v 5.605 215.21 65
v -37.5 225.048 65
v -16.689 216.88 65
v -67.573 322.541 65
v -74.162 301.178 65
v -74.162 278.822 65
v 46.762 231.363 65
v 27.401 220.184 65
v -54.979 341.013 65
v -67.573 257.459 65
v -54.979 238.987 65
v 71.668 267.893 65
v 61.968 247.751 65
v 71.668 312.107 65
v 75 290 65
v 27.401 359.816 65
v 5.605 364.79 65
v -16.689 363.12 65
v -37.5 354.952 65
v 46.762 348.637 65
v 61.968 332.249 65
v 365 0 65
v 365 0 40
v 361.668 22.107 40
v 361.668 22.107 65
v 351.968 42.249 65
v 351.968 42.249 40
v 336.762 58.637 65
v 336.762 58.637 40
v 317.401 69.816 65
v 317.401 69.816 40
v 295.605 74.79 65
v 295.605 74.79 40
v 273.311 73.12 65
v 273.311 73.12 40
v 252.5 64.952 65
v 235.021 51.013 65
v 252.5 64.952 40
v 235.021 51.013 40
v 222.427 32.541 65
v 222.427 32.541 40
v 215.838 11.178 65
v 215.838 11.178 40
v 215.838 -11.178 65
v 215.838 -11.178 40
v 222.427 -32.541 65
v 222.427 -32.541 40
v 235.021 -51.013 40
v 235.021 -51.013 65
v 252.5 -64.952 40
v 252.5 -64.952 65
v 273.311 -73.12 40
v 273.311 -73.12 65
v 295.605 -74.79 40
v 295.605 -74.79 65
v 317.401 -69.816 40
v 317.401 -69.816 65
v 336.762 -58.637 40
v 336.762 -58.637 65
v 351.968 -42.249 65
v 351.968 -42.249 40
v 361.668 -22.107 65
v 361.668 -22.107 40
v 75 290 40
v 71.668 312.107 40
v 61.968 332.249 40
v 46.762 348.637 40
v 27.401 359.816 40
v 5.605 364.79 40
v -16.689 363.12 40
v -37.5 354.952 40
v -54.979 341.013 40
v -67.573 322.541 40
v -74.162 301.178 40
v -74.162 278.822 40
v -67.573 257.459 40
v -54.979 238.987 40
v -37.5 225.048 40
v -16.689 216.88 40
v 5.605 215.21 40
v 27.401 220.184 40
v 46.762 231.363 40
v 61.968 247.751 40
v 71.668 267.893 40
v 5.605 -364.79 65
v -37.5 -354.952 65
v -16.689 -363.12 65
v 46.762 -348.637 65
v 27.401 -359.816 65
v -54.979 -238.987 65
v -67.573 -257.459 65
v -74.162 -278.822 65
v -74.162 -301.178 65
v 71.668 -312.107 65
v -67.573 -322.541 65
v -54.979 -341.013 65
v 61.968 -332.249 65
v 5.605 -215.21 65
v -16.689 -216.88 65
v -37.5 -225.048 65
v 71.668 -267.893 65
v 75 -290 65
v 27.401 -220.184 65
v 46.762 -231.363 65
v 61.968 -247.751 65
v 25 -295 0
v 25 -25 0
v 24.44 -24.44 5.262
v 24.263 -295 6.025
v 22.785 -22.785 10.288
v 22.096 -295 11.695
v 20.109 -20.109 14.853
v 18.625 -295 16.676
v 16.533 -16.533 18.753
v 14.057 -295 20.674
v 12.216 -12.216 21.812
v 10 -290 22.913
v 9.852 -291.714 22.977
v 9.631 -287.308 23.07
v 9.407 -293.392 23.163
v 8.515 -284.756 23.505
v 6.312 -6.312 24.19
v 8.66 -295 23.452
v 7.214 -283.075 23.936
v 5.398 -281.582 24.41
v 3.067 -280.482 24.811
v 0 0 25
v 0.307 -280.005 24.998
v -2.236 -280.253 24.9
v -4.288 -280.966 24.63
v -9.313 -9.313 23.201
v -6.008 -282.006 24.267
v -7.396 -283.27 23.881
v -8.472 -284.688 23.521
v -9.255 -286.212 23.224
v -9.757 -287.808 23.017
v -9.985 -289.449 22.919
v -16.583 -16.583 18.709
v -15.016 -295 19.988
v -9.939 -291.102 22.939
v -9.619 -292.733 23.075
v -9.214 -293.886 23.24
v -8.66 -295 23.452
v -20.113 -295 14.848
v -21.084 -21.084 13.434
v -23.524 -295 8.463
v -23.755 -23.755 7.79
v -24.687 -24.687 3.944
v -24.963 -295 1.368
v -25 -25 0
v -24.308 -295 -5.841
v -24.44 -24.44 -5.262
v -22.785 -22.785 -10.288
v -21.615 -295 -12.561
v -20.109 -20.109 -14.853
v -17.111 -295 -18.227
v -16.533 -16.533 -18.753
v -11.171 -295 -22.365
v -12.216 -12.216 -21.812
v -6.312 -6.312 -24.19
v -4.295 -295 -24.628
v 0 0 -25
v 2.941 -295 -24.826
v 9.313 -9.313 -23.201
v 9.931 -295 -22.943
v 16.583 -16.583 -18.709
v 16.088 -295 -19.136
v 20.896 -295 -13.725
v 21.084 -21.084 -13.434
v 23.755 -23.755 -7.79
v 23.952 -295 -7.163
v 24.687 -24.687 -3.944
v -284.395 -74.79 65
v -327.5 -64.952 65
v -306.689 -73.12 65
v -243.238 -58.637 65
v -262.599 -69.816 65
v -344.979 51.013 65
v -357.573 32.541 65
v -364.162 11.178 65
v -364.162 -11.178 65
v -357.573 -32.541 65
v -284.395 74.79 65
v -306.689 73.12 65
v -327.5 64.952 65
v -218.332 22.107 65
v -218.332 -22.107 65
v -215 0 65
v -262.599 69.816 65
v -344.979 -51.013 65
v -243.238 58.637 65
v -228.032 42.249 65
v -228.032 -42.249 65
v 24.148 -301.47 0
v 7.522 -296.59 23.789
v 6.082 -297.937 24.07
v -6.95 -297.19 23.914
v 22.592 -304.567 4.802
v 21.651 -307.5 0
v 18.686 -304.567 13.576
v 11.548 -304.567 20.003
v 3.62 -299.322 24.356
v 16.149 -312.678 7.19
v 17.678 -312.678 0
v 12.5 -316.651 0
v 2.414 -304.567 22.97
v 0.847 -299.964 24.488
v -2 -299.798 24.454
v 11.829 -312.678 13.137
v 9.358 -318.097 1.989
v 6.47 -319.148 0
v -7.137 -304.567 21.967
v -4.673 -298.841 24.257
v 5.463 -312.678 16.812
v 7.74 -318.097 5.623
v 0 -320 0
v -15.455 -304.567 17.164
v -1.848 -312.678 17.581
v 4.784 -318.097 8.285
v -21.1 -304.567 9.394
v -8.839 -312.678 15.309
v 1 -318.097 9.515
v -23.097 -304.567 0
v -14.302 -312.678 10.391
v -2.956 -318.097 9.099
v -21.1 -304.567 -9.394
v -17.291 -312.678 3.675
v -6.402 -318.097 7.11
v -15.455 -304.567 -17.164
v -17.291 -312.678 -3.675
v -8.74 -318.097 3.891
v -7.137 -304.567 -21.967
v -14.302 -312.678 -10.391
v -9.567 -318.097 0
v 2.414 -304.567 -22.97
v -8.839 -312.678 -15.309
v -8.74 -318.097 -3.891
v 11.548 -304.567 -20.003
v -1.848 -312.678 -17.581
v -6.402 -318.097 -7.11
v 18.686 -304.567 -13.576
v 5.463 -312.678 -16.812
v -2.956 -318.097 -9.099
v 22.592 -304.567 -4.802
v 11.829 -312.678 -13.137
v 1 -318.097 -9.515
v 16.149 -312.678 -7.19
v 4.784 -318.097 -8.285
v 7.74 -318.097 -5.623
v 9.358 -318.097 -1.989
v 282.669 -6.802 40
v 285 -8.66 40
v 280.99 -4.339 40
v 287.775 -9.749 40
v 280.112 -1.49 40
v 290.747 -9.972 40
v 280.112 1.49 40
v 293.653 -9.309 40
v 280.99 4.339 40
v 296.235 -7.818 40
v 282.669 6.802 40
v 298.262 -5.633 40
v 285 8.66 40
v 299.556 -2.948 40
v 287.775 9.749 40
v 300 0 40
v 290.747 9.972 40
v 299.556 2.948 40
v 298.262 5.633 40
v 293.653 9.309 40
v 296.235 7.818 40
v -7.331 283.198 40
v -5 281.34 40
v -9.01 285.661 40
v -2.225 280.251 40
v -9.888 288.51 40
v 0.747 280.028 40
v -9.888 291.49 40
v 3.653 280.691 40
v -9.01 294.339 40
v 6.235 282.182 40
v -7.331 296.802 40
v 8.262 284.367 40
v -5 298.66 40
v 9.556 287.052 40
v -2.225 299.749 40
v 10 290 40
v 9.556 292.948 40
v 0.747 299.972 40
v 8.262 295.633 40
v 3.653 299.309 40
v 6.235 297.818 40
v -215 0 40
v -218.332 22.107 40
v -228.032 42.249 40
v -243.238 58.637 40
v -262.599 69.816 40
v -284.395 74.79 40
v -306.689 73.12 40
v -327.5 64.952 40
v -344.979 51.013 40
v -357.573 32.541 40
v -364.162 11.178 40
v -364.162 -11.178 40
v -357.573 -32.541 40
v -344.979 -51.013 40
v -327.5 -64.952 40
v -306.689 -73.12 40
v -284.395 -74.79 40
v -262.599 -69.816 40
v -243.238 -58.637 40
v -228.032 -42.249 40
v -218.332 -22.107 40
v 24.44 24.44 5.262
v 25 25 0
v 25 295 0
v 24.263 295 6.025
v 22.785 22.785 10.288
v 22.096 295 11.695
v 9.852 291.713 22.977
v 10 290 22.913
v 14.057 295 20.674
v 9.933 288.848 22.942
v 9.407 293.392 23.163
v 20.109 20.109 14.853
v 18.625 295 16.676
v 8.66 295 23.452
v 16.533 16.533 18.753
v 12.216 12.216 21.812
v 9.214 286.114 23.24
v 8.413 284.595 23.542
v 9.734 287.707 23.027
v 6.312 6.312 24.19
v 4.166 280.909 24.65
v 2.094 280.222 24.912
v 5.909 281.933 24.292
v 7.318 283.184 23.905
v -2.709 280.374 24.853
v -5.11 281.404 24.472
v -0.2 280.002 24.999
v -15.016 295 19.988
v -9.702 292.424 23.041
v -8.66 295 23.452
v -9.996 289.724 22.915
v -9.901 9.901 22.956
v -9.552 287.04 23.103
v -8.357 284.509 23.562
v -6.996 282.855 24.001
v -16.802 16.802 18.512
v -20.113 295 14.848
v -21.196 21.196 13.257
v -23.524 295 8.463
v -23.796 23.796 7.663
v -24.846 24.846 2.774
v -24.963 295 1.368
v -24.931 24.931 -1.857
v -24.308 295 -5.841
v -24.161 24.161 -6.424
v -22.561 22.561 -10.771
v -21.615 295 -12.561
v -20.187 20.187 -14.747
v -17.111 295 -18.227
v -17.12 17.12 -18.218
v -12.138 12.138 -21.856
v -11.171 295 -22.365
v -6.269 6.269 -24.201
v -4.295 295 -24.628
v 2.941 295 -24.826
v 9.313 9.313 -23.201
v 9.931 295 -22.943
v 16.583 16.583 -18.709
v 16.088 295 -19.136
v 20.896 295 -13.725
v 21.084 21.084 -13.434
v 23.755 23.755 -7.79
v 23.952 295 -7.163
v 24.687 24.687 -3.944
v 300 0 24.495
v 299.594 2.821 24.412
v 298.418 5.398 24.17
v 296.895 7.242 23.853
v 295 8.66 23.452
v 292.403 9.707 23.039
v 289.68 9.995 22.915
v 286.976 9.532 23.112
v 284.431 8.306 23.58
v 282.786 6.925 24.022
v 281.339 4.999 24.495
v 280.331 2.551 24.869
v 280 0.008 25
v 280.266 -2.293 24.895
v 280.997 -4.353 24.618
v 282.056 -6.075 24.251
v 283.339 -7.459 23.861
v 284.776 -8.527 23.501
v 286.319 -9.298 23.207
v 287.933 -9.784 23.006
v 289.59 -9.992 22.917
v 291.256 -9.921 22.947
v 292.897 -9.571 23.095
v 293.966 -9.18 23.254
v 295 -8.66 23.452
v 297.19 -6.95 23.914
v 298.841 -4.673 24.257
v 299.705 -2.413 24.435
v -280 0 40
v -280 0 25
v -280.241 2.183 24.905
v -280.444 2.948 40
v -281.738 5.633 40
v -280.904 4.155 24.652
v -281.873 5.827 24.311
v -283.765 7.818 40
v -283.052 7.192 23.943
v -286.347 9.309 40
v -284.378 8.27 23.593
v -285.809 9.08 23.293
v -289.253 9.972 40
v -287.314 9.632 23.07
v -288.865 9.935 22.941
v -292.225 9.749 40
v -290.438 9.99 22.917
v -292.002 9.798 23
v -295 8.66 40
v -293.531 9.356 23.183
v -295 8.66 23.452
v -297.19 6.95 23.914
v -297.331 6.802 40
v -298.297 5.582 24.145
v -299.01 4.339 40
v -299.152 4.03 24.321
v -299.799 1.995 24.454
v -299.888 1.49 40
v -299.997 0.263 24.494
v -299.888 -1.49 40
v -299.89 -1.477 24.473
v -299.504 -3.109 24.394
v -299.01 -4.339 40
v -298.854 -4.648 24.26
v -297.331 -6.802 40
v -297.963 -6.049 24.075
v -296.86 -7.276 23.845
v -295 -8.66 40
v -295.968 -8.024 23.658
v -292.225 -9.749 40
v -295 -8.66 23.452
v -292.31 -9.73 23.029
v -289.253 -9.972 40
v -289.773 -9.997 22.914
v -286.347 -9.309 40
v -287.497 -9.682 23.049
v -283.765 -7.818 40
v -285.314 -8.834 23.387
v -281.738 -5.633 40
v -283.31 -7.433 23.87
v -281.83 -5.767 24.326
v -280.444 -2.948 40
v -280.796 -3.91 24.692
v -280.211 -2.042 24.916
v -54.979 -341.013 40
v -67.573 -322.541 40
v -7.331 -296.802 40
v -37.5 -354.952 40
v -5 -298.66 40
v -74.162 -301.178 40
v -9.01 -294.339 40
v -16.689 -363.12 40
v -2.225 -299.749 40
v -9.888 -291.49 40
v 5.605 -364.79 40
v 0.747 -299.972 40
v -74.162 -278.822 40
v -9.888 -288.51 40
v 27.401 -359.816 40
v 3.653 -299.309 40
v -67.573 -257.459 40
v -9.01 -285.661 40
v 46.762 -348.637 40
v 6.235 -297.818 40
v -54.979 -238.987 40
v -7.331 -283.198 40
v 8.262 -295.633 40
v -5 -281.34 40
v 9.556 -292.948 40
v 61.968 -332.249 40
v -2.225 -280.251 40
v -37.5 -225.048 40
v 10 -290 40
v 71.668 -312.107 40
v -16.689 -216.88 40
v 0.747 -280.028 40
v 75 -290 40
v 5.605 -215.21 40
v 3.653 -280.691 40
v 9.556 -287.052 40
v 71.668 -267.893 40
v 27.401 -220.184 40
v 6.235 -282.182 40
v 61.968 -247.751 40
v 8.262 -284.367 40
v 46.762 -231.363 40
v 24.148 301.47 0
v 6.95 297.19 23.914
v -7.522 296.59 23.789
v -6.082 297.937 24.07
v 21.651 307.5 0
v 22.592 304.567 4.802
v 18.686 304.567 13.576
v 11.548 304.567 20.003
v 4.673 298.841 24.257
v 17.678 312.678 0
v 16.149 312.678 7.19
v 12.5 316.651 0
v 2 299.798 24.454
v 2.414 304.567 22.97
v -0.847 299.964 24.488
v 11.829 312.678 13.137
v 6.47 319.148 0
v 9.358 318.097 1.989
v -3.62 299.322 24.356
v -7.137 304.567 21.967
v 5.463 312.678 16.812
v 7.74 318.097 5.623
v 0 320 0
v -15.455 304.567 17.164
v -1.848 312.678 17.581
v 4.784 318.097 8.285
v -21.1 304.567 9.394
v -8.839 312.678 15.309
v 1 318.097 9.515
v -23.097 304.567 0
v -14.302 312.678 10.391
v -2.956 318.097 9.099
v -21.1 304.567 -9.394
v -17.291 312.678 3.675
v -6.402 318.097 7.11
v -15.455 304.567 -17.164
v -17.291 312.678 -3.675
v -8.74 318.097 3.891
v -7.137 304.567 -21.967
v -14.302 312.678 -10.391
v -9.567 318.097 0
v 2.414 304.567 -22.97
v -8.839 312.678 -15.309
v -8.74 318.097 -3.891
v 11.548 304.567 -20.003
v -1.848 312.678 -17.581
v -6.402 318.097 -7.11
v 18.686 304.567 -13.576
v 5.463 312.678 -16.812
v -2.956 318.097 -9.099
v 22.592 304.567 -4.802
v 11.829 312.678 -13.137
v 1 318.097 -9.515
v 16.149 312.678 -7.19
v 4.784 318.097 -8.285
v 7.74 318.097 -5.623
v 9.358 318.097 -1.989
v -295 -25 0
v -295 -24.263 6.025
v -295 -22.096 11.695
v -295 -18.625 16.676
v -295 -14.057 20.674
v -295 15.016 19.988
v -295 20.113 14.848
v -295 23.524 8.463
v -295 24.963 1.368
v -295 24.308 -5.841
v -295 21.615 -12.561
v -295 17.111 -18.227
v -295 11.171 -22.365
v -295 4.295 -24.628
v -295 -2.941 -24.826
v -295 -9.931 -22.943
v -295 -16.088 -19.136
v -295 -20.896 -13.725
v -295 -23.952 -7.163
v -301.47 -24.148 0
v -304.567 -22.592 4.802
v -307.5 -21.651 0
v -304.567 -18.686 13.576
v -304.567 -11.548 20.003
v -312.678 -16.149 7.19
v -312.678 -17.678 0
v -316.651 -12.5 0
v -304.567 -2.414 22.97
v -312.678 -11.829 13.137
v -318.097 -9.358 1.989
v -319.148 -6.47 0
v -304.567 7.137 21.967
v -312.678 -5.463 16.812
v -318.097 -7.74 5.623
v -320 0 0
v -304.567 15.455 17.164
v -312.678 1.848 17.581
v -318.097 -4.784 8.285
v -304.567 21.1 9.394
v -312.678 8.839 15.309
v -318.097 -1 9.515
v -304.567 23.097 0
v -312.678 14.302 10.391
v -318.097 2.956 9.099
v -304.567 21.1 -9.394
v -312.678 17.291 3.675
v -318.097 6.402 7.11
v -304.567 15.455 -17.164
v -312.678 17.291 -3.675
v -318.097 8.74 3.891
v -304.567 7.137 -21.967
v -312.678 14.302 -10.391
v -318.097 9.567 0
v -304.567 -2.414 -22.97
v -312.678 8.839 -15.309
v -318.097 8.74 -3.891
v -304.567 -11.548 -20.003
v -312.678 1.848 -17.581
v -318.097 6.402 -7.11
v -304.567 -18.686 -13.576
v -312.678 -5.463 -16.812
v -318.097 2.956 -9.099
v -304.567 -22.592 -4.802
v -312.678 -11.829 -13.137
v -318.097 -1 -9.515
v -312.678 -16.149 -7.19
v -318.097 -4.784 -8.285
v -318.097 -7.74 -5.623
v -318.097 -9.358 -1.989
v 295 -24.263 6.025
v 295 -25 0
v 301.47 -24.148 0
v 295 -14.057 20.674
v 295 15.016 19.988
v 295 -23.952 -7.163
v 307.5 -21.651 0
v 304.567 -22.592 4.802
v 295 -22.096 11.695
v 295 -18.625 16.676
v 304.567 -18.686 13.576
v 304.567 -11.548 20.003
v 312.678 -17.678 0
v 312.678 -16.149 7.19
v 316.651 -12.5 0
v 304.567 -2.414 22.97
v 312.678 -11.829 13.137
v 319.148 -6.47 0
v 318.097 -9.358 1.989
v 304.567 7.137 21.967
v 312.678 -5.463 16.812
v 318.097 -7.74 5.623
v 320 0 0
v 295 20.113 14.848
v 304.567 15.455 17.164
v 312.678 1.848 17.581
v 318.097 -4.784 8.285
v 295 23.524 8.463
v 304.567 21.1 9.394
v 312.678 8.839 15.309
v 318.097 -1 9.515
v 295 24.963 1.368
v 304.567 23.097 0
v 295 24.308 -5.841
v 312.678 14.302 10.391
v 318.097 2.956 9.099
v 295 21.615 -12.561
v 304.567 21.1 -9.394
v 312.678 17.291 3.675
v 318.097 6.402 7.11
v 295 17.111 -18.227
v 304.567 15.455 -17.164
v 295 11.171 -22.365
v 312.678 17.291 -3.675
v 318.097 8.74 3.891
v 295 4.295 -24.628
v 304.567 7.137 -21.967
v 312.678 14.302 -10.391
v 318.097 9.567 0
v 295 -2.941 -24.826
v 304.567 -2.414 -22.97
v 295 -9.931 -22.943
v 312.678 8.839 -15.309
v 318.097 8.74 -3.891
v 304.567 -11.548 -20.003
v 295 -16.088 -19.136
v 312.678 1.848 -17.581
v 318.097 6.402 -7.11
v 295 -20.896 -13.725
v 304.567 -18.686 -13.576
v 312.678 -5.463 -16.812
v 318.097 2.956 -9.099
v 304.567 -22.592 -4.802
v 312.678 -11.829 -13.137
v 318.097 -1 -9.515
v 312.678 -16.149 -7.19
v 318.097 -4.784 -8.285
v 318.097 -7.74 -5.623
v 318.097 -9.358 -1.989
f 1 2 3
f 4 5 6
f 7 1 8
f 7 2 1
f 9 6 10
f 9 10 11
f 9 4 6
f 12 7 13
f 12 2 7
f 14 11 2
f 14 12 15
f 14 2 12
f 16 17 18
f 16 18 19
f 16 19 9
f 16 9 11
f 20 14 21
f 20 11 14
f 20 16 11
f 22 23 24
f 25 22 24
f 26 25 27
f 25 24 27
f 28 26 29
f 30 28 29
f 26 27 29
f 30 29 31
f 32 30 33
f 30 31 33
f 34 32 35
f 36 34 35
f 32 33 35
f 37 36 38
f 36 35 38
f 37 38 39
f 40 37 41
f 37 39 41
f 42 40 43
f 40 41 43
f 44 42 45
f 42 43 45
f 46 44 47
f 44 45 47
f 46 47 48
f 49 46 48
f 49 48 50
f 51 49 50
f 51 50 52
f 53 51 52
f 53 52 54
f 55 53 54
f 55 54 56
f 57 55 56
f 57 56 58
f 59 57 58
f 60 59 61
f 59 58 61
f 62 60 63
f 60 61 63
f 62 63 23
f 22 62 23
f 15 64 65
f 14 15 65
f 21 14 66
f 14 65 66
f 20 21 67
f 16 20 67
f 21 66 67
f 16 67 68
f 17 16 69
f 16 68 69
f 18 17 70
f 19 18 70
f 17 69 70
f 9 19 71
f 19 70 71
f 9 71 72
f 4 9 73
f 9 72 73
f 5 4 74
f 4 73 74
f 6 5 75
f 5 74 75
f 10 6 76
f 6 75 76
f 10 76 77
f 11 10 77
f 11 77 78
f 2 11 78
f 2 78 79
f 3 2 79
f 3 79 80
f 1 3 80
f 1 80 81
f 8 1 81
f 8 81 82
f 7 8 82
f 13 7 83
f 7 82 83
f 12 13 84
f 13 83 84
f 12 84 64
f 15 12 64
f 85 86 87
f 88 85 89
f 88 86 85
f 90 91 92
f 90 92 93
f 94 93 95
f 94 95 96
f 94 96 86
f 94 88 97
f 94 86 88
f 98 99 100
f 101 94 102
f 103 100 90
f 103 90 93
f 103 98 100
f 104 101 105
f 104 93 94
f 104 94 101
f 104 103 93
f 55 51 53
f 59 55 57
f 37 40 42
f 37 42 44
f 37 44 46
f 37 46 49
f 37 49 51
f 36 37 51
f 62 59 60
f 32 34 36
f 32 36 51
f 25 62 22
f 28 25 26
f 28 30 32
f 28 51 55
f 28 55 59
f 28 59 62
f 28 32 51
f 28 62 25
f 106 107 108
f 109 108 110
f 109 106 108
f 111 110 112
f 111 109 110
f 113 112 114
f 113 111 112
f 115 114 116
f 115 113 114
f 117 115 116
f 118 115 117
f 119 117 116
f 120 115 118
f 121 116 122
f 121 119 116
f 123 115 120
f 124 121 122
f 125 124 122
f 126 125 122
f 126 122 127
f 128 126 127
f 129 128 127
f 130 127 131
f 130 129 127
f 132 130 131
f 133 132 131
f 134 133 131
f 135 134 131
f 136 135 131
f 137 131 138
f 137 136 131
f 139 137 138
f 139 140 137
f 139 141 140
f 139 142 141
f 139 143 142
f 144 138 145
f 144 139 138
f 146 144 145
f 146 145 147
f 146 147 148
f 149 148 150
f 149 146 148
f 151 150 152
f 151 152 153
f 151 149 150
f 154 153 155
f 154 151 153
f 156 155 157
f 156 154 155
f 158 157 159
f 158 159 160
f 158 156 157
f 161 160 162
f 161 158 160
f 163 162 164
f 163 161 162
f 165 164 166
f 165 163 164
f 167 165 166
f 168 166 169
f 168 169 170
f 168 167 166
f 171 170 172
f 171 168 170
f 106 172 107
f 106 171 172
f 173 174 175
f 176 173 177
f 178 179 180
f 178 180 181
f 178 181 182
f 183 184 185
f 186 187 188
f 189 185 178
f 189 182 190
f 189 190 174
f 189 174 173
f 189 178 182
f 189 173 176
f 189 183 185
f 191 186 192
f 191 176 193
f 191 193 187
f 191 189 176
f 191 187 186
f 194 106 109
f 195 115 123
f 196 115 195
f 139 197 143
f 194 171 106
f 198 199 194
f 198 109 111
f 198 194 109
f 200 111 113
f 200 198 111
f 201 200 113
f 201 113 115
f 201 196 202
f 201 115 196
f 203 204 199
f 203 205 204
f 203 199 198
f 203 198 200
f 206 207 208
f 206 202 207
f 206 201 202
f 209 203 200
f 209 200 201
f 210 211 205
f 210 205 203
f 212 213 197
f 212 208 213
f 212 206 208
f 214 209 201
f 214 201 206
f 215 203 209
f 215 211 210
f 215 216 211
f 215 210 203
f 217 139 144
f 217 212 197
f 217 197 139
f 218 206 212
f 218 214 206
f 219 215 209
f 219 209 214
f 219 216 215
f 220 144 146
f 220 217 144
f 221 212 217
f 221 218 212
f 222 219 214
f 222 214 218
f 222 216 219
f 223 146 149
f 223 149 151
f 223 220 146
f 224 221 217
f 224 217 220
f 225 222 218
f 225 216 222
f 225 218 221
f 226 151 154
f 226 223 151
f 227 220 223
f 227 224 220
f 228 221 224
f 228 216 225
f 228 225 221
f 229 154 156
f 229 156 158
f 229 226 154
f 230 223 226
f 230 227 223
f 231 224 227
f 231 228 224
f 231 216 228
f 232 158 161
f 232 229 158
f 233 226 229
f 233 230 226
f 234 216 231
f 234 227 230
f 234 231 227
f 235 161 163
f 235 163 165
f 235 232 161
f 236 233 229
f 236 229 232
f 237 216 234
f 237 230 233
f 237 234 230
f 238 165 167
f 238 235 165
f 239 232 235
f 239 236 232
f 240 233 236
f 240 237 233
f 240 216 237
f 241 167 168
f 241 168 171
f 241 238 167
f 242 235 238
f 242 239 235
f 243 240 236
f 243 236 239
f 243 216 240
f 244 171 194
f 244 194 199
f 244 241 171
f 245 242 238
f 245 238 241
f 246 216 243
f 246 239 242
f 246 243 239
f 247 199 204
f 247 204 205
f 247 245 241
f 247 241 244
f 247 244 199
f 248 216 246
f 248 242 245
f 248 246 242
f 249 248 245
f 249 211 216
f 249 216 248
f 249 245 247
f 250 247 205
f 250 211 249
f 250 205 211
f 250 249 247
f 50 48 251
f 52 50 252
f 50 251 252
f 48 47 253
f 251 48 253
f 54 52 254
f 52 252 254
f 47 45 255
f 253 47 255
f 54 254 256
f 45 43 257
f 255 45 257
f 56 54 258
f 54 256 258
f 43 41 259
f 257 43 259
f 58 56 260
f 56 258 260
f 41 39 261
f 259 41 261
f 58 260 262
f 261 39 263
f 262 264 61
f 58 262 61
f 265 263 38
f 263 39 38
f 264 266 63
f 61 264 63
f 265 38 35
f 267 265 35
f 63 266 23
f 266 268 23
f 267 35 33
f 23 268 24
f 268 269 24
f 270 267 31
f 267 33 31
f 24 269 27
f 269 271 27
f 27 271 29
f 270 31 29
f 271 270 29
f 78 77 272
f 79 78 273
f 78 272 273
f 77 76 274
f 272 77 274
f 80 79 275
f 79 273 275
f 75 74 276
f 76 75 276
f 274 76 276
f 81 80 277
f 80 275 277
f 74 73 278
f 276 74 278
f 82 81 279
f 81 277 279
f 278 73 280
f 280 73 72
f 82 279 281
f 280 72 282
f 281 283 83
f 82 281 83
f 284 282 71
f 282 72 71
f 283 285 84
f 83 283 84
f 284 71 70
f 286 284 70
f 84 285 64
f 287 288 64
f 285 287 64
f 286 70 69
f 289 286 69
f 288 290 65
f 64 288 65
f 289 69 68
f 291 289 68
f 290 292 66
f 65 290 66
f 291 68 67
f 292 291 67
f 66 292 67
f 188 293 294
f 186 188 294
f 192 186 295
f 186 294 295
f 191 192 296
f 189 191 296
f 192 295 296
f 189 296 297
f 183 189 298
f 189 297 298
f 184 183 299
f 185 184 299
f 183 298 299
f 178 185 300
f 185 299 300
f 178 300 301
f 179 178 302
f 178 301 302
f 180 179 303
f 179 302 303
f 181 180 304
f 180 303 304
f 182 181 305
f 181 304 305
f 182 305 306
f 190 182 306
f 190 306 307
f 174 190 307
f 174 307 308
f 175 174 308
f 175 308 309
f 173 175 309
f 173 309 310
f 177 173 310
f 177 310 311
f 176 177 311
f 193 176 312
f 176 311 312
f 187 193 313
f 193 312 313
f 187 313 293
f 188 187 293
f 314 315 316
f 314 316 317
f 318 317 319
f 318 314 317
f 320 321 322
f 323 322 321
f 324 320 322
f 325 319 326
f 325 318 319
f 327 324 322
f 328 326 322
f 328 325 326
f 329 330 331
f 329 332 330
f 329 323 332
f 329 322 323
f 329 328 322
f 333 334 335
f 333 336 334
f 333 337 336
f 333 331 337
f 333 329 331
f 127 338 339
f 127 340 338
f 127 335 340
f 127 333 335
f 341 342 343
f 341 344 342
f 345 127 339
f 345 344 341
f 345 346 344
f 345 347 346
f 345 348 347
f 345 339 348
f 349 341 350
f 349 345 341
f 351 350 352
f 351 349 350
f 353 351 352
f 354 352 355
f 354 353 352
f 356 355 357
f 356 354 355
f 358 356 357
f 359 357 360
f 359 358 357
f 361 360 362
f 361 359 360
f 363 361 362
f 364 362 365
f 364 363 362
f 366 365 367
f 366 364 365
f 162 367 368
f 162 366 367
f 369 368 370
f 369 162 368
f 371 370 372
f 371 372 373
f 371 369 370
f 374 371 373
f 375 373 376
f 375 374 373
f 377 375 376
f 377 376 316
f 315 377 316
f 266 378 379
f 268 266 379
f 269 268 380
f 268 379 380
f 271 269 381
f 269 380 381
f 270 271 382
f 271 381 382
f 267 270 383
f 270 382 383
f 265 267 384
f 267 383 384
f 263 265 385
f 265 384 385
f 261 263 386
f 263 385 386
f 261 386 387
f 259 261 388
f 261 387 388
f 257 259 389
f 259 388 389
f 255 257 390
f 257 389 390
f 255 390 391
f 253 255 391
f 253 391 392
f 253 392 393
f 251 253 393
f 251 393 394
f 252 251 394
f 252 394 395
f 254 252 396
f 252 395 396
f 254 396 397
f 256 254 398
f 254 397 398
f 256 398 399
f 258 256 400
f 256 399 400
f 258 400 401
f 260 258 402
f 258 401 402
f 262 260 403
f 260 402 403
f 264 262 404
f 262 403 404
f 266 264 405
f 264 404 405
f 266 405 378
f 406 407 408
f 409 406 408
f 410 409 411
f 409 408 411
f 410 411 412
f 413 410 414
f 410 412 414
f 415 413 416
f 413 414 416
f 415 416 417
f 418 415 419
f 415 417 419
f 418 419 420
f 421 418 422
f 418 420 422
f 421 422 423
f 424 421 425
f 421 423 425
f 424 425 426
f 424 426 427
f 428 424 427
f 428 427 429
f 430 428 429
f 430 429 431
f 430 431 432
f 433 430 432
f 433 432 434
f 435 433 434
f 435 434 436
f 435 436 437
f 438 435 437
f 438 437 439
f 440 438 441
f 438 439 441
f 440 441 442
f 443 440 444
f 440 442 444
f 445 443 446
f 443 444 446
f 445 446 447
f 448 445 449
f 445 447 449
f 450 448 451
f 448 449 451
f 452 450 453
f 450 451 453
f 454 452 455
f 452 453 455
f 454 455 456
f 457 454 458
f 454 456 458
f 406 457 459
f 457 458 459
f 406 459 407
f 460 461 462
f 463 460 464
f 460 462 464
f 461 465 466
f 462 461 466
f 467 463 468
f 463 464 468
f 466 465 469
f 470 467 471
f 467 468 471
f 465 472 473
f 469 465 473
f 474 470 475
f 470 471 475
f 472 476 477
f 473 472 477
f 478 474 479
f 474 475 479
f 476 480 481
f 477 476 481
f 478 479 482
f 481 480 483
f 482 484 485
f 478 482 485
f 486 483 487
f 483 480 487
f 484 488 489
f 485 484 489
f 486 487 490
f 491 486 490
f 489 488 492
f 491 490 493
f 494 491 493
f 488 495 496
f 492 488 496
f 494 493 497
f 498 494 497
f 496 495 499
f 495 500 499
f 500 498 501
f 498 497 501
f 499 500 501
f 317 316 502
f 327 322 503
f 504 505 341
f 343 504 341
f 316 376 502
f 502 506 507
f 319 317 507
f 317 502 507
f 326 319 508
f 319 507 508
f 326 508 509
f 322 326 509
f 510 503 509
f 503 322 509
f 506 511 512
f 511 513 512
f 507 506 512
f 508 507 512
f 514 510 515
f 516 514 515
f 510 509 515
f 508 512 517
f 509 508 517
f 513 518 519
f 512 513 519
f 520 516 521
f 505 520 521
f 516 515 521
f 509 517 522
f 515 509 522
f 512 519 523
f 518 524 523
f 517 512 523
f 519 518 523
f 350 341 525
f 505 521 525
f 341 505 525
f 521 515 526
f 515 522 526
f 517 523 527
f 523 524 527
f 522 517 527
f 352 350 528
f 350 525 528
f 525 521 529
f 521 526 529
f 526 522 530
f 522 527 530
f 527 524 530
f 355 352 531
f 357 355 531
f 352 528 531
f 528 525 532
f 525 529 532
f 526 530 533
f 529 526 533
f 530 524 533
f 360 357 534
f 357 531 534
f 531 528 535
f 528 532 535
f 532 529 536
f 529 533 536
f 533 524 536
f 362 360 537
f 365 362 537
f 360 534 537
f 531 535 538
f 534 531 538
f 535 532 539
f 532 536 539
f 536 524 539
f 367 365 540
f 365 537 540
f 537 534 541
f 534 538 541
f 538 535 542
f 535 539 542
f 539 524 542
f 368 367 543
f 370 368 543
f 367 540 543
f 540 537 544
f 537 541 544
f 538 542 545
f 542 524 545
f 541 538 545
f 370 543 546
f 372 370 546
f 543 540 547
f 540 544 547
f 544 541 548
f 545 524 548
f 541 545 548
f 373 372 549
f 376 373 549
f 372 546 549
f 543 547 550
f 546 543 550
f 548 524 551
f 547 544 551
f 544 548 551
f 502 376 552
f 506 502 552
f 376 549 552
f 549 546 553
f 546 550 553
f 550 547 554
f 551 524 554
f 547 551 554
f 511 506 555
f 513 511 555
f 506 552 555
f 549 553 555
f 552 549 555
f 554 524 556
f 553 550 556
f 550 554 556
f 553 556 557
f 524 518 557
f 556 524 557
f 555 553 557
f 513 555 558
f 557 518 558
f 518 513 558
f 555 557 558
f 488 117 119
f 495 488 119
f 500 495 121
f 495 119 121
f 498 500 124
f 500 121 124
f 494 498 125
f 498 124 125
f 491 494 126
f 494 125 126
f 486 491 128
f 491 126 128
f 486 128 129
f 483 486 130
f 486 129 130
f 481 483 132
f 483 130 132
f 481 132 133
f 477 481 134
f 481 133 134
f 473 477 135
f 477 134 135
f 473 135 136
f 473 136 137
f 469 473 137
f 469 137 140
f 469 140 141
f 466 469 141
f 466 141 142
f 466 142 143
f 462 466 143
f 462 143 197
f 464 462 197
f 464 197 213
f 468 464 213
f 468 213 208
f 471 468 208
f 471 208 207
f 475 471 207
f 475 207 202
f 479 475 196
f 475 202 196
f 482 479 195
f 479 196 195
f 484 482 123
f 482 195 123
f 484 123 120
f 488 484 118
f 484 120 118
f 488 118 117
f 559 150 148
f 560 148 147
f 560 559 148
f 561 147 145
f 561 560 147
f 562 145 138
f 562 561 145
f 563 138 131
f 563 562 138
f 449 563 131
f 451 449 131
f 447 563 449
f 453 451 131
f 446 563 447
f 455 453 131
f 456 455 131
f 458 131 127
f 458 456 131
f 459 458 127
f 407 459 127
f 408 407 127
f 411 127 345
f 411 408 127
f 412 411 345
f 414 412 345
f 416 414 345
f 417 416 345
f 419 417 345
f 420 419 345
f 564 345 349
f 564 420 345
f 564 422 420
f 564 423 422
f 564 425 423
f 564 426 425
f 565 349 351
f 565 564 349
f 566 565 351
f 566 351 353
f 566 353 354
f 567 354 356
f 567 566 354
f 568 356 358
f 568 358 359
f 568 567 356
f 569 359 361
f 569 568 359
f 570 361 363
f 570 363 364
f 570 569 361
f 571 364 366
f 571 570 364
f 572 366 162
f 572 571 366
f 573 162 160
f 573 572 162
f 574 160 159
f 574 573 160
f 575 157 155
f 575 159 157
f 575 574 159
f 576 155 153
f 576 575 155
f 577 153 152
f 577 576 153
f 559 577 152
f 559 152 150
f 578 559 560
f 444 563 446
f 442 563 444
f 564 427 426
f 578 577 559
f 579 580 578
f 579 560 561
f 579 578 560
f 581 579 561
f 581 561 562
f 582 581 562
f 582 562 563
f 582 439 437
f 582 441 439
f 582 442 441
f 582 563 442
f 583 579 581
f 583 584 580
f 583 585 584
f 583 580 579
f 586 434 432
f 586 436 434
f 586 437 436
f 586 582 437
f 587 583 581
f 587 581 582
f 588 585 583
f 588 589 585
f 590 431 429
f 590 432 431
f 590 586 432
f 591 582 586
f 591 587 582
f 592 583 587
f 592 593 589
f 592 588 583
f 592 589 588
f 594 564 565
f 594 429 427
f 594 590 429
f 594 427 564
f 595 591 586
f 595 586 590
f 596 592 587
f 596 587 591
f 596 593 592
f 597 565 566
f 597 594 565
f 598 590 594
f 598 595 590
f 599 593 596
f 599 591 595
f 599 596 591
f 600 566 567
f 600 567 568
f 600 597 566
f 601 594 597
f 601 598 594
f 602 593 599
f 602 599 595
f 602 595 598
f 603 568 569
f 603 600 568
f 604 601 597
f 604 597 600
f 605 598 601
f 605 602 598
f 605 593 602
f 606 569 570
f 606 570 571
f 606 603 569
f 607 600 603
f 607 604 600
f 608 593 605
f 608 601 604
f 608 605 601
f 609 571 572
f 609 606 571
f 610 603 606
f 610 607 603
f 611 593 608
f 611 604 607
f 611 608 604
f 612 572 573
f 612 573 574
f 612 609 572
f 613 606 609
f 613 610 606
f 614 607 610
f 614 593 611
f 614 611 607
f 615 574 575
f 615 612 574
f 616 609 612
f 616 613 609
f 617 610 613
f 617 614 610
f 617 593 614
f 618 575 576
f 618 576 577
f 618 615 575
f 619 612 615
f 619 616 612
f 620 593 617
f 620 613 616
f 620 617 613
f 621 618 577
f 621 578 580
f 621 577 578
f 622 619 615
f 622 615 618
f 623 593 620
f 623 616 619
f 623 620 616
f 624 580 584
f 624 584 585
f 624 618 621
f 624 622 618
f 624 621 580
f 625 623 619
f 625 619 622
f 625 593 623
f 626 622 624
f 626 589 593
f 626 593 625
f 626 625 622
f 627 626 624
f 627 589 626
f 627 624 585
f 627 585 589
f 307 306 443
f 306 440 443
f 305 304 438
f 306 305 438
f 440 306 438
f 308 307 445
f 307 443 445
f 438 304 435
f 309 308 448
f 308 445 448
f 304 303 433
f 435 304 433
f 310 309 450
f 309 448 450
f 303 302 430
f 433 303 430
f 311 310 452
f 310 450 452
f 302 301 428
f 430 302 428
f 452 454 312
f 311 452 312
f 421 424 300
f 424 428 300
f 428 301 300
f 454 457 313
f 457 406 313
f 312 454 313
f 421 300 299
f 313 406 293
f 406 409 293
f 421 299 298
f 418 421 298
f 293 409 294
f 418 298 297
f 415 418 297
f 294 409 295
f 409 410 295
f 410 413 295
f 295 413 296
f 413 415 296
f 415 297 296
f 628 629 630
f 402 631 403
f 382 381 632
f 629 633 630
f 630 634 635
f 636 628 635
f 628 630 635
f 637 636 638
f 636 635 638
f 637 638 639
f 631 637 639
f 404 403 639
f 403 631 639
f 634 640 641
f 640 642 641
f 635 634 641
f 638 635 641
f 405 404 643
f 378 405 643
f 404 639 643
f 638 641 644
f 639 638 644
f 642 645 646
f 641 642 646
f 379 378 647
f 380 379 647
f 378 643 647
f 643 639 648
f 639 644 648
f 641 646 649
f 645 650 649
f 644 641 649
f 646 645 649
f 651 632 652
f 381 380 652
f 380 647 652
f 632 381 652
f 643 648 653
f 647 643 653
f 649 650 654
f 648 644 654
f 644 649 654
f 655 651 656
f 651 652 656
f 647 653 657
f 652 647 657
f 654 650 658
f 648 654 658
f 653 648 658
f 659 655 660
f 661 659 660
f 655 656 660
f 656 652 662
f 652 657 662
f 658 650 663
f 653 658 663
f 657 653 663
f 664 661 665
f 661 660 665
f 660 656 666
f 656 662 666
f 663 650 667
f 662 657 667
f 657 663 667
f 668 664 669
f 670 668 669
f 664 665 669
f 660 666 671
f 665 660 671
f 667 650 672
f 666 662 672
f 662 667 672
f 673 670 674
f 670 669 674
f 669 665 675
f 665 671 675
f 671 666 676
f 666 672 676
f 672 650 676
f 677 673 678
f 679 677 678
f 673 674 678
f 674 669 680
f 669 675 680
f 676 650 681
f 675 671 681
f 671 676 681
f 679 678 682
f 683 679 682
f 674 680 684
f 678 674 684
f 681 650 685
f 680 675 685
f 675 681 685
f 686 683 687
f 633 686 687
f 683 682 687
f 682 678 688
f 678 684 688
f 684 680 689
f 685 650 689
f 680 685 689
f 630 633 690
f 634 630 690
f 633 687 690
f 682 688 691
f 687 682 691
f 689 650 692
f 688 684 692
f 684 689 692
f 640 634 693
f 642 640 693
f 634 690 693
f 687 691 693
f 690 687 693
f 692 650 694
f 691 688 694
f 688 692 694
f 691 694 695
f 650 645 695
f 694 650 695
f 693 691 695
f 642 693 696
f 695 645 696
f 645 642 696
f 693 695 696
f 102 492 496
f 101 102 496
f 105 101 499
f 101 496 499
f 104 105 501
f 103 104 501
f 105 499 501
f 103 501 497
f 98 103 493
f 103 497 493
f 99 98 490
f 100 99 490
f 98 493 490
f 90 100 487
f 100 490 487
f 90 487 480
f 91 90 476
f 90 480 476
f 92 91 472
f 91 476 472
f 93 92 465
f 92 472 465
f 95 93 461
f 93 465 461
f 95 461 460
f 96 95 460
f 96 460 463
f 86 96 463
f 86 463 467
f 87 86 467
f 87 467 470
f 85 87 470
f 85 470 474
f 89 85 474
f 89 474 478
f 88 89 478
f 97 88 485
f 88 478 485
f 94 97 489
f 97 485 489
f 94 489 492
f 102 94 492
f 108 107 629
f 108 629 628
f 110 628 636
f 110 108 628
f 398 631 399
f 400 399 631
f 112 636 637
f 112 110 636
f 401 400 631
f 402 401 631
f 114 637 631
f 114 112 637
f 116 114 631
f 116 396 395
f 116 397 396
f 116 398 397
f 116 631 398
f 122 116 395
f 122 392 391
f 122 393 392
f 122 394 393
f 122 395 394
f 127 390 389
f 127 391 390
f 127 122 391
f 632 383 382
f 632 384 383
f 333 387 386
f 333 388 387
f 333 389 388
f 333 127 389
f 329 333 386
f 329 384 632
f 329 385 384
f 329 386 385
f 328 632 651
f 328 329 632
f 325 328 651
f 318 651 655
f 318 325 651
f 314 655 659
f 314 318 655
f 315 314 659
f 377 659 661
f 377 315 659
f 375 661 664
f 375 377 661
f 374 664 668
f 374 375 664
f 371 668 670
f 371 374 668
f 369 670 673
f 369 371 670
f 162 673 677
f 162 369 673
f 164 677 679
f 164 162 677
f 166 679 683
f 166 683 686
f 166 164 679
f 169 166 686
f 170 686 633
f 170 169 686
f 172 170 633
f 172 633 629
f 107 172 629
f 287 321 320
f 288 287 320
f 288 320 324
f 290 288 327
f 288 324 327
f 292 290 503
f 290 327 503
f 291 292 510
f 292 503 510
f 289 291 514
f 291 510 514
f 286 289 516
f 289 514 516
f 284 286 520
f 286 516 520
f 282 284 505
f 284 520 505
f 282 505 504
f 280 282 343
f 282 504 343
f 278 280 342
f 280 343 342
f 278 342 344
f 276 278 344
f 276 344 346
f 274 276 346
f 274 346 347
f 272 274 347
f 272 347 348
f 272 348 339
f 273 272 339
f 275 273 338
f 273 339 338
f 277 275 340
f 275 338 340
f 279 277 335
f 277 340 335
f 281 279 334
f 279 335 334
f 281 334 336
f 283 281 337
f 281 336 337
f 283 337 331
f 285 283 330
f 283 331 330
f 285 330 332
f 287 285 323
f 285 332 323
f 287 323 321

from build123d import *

# Parameters (mm, degrees)
F0_R     = 25
F1_DEPTH = 320
F2_COUNT = 2
F2_ANGLE = 90
F3_R     = 25
F4_R     = 10
F5_DEPTH = 40
F7_R     = 75
F8_DEPTH = 25


with BuildPart() as f1:
    # F0 (on Front) → F1 (new body, symmetric)
    with BuildSketch(Plane.XZ):
        Circle(F0_R)
    extrude(amount=F1_DEPTH, both=True)

    # F2: F1 ×2 about axis
    f2_axis = Axis((0, 0, 1.4691501971), (0, 0, -1))


with BuildPart() as f1_1:
    add(f1.part)
    for i in range(1, F2_COUNT):
        add(f1.part.rotate(f2_axis, i * F2_ANGLE / (F2_COUNT - 1)))

    # F3
    f3_edges = [f1_1.edges().sort_by_distance(p)[0] for p in [
        (-25, -320, 0),
        (320, 25, 0),
        (-25, 320, 0),
        (-320, 25, 0),
    ]]
    fillet(f3_edges, radius=F3_R)

    # F4 (on Top) → F5 (join)
    with BuildSketch(Plane.XY):
        with Locations((-290, 0)):
            Circle(F4_R)
        with Locations((0, -290)):
            Circle(F4_R)
        with Locations((290, 0)):
            Circle(F4_R)
        with Locations((0, 290)):
            Circle(F4_R)
    extrude(amount=F5_DEPTH)

    # F7 (on offset) → F8 (join)
    with BuildSketch(Plane.XY.offset(40)):
        with Locations((-290, 0)):
            Circle(F7_R)
        with Locations((-3.72e-08, 290)):
            Circle(F7_R)
        with Locations((290, 7.44e-08)):
            Circle(F7_R)
        with Locations((1.116e-07, -290)):
            Circle(F7_R)
    extrude(amount=F8_DEPTH)


solid = f1_1.part
